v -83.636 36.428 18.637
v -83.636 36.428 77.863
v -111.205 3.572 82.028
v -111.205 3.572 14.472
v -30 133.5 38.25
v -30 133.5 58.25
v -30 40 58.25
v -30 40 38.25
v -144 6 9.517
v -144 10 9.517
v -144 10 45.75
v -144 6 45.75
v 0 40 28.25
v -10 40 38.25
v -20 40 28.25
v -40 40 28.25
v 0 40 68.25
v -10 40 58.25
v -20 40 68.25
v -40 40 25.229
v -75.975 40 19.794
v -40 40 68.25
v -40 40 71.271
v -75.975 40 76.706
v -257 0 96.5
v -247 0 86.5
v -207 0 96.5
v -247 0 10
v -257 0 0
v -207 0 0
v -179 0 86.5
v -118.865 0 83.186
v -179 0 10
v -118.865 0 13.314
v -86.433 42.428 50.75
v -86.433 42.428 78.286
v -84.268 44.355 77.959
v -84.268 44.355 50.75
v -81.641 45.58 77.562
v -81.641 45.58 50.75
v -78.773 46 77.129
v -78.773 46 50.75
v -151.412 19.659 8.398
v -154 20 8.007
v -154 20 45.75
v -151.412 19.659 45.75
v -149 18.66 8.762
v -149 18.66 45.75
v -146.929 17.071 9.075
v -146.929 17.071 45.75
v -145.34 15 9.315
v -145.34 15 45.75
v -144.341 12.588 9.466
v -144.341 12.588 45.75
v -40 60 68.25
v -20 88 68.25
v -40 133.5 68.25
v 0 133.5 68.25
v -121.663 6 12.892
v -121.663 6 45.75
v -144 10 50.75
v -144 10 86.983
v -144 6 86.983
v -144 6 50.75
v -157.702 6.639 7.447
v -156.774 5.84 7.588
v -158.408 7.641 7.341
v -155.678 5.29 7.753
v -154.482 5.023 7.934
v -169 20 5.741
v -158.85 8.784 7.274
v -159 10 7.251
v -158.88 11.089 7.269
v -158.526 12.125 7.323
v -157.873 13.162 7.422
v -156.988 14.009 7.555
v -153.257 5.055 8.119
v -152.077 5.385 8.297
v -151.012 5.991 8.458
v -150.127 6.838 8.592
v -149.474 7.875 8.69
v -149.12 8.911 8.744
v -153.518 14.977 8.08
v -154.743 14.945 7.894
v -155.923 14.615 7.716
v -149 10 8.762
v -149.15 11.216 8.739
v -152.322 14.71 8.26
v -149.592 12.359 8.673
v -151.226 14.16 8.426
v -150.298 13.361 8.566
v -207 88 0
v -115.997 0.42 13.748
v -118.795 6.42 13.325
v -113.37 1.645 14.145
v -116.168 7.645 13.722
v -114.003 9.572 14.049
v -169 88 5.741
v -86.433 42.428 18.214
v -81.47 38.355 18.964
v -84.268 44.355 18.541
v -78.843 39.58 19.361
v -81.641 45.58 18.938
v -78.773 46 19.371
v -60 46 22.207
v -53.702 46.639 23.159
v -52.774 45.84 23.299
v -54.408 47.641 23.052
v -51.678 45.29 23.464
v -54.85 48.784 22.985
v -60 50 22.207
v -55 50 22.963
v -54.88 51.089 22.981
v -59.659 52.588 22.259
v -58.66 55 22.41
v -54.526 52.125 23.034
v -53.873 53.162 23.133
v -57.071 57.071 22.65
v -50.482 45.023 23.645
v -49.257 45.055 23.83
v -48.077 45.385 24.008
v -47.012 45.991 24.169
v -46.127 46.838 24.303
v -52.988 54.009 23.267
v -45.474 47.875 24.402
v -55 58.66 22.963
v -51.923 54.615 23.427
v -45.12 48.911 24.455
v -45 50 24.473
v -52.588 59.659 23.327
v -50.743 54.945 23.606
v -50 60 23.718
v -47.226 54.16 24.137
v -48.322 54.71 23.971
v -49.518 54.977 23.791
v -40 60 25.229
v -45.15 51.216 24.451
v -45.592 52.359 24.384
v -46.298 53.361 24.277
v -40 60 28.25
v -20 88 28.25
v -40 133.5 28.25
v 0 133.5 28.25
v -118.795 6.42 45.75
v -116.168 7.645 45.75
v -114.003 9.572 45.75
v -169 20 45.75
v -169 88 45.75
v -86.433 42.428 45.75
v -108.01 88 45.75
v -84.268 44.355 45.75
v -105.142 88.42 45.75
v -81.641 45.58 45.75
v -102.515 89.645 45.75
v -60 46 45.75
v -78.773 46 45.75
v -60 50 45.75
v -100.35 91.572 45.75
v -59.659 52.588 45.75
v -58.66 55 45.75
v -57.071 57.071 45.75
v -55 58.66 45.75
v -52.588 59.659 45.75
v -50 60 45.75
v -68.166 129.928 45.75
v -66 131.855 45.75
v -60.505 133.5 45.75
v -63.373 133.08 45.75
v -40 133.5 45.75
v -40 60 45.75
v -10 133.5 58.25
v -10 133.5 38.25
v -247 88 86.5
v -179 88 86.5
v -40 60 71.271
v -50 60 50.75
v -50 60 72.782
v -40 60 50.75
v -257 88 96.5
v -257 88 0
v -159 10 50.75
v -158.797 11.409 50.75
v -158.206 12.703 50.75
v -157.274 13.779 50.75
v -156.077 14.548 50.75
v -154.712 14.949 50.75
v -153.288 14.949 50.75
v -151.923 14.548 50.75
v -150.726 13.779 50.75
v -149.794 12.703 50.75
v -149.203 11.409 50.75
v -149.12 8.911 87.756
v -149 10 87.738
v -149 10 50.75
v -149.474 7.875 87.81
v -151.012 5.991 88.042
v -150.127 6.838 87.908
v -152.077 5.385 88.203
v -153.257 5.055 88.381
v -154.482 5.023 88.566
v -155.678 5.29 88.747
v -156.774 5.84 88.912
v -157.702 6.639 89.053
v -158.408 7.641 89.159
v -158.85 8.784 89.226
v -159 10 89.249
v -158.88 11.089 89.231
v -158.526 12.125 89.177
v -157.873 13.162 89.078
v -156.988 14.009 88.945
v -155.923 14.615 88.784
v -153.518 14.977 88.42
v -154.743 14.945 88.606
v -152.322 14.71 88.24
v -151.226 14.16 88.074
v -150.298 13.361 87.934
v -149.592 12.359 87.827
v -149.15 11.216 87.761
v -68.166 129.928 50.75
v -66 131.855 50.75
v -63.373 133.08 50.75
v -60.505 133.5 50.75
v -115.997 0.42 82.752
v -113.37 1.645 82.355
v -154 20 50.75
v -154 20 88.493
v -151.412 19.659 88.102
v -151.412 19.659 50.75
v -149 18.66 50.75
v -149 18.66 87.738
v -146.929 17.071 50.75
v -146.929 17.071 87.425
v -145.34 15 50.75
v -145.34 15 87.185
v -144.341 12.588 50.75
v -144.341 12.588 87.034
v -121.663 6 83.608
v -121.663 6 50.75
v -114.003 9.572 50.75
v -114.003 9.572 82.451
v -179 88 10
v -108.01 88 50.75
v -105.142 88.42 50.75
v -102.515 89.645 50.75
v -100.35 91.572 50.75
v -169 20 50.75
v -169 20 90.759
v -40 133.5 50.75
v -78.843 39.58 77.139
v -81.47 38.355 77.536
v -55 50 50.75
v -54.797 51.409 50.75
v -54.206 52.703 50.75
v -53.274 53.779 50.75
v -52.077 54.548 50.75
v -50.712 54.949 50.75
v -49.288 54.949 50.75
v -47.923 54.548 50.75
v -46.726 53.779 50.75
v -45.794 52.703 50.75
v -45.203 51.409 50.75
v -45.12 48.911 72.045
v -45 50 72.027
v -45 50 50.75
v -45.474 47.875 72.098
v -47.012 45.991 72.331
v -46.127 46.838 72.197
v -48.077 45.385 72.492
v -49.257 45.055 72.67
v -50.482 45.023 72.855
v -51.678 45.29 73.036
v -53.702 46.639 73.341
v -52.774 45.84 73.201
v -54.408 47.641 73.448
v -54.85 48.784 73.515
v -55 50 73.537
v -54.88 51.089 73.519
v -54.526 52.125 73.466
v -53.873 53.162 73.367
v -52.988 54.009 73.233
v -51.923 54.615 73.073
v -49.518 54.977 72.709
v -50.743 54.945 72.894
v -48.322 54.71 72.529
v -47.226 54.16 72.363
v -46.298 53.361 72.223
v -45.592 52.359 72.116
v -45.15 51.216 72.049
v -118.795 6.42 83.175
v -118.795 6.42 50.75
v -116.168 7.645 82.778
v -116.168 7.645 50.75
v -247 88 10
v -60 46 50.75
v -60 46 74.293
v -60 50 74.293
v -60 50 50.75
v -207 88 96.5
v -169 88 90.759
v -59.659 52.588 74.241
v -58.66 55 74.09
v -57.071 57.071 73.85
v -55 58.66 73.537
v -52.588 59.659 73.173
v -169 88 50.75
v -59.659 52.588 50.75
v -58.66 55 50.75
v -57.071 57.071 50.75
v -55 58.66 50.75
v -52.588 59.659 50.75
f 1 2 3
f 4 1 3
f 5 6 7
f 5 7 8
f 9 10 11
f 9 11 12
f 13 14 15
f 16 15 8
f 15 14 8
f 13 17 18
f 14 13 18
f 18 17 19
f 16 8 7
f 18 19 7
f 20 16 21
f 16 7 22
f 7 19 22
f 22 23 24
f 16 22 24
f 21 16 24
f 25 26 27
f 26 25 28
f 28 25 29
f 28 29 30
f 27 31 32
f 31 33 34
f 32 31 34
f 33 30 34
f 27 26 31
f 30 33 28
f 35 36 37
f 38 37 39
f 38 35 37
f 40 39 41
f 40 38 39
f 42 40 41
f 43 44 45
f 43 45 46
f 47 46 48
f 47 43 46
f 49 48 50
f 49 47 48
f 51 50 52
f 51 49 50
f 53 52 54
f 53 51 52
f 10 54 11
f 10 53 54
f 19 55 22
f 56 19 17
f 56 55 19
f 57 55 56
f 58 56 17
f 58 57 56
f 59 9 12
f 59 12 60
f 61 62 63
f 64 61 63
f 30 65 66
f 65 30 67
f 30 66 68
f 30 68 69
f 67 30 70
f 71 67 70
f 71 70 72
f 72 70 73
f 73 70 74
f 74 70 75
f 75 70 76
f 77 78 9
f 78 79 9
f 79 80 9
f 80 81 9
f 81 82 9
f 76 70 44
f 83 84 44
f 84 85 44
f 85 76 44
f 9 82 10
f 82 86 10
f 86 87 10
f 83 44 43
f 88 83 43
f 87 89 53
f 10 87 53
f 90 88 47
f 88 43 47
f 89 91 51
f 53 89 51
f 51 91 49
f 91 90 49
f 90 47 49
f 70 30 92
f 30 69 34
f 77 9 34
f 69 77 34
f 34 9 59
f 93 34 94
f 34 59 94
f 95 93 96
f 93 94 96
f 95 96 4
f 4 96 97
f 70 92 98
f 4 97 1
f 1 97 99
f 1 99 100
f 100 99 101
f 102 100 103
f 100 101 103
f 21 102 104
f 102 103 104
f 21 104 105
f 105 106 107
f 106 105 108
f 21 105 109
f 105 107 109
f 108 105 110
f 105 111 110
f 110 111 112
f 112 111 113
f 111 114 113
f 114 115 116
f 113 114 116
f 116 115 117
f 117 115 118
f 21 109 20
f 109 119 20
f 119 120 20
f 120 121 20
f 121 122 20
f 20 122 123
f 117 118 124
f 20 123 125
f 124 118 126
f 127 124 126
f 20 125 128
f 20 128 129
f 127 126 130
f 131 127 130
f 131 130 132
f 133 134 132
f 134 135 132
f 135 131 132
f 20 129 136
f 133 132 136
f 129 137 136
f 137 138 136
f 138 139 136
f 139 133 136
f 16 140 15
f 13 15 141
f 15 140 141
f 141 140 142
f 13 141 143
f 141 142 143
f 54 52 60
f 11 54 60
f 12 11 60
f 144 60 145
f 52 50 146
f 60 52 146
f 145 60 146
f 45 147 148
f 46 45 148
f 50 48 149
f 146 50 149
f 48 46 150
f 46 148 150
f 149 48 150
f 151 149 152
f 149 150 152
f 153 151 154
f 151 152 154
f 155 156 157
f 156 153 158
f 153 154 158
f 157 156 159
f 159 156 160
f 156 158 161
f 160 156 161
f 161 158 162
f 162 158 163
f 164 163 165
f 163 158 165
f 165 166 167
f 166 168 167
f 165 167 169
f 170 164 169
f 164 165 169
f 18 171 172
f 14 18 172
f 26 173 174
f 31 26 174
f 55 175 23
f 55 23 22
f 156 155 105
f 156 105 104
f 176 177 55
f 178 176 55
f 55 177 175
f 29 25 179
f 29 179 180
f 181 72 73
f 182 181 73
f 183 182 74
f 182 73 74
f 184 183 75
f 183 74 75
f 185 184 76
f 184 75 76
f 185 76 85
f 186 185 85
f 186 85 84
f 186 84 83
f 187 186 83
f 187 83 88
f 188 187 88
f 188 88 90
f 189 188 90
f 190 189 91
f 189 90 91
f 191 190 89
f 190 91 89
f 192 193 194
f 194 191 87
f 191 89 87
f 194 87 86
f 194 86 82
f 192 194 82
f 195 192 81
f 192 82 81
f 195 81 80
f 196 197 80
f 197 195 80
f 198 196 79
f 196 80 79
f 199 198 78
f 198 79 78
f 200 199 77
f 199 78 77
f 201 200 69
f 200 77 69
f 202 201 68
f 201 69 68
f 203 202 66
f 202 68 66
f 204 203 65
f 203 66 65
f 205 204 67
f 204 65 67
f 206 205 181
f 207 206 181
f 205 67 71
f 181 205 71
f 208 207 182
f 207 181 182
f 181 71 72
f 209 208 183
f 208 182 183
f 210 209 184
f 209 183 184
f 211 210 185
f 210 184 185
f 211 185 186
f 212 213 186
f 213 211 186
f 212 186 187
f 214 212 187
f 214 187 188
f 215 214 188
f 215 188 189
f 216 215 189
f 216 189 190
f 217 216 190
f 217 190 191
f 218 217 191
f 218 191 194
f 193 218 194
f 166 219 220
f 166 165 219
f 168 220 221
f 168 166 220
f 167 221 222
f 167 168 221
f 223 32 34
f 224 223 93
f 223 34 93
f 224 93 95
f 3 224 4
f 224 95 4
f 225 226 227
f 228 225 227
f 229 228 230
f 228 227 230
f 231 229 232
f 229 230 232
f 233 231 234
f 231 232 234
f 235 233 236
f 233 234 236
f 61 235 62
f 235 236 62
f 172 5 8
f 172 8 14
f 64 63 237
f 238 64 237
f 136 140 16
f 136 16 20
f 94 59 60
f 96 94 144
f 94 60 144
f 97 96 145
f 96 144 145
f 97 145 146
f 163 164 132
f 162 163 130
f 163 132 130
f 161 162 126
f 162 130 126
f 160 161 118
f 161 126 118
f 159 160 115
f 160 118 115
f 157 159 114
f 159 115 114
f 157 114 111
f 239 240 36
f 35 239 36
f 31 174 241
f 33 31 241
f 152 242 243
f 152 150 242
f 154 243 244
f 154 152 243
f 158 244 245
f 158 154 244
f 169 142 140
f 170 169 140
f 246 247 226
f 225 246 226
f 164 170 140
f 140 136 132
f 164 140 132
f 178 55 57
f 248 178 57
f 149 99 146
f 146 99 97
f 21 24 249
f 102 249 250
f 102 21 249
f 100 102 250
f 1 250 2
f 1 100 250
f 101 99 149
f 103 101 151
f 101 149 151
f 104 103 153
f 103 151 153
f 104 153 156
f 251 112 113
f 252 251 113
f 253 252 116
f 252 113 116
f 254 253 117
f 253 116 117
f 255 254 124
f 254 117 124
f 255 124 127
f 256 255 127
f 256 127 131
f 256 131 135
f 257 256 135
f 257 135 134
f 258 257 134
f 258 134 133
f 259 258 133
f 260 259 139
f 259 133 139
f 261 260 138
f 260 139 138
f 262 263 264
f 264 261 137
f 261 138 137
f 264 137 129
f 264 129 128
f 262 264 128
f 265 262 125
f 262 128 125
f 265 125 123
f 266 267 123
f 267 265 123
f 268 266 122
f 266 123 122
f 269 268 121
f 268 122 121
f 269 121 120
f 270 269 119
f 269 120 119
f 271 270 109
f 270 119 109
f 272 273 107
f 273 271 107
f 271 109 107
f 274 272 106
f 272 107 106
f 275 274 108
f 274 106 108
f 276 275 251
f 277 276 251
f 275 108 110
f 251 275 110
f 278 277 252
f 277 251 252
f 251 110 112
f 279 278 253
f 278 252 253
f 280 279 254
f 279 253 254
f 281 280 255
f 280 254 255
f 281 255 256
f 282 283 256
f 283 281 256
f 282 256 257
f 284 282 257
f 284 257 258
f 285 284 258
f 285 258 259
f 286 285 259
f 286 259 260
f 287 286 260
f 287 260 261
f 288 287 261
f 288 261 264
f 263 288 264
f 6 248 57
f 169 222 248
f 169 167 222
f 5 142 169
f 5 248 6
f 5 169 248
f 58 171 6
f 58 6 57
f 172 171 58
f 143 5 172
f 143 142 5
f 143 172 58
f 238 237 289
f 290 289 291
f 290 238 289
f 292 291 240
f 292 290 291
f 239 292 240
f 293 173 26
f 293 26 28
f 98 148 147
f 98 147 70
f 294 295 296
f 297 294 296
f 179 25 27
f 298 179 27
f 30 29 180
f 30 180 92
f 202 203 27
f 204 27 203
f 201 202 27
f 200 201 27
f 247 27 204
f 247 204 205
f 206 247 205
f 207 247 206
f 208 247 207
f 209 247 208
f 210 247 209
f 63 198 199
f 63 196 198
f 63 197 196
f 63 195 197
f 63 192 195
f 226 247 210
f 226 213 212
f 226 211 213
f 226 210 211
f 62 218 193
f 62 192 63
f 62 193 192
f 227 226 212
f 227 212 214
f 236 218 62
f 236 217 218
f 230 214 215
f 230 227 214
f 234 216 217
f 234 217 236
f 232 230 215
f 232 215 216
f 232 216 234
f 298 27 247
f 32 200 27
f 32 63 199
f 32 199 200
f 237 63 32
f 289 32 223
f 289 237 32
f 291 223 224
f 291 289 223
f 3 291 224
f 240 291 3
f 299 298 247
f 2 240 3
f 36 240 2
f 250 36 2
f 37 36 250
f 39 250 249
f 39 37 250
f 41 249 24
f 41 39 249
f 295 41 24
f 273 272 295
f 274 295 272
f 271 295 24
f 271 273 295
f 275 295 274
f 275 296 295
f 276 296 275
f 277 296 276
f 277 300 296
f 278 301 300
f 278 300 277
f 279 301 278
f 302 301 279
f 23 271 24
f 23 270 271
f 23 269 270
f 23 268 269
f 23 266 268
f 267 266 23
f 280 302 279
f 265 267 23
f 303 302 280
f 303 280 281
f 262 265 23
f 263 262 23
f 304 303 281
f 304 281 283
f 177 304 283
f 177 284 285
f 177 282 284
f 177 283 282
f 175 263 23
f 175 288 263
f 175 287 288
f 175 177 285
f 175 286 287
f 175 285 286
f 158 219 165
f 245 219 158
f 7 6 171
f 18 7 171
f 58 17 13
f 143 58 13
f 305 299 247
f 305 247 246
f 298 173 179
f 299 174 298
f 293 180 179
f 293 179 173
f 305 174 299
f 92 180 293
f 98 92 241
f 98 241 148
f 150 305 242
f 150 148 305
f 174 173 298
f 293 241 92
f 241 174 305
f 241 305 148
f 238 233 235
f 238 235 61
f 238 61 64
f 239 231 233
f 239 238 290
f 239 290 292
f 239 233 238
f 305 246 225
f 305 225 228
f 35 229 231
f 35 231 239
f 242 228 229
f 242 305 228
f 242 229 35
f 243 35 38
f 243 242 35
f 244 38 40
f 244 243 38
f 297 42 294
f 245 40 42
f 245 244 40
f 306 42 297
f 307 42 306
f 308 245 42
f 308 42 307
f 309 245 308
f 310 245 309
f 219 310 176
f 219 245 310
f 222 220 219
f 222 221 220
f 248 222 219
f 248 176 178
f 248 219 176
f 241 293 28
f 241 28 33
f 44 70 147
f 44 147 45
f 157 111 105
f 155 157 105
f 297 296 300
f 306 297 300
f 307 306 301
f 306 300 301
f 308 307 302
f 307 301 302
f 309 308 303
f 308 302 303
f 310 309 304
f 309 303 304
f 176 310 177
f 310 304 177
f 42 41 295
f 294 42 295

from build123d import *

# Parameters (mm, degrees)
SKETCH1_W           = 257
SKETCH1_H           = 96.5
BOSS_EXTRUDE1_DEPTH = 133.5
SKETCH2_W           = 140
SKETCH2_H           = 96.5
CUT_EXTRUDE1_DEPTH  = 45.5
SKETCH3_W           = 52
SKETCH3_H           = 45.75
CUT_EXTRUDE2_DEPTH  = 68
SKETCH4_W           = 68
SKETCH4_H           = 76.5
CUT_EXTRUDE3_DEPTH  = 89
SKETCH5_R           = 5
CUT_EXTRUDE4_DEPTH  = 45.75
SKETCH6_R           = 5
CUT_EXTRUDE5_DEPTH  = 45.75
SKETCH7_R           = 5
CUT_EXTRUDE6_DEPTH  = 97.5
CUT_EXTRUDE7_DEPTH  = 97.5
CUT_EXTRUDE8_DEPTH  = 97.5
SKETCH10_R          = 5
CUT_EXTRUDE9_DEPTH  = 45.75
CUT_EXTRUDE10_DEPTH = 45.75
SKETCH12_R          = 5
CUT_EXTRUDE11_DEPTH = 97.5
SKETCH13_W          = 40
SKETCH13_H          = 28.25
CUT_EXTRUDE12_DEPTH = 134.5
SKETCH14_W          = 20
SKETCH14_H          = 20
CUT_EXTRUDE13_DEPTH = 134.5
CUT_EXTRUDE14_DEPTH = 89
FILLET1_R           = 10
FILLET2_R           = 10


with BuildPart() as part:
    # Sketch1 → Boss-Extrude1 (new body)
    with BuildSketch(Plane(origin=(0, 0, 0), x_dir=(1, 0, 0), z_dir=(0, 1, 0))):
        with Locations((-128.5, -48.25)):
            Rectangle(SKETCH1_W, SKETCH1_H)
    extrude(amount=BOSS_EXTRUDE1_DEPTH)

    # Sketch2 → Cut-Extrude1 (cut)
    with BuildSketch(Plane(origin=(0, 133.5, 0), x_dir=(1, 0, 0), z_dir=(0, 1, 0))):
        with Locations((-187, -48.25)):
            Rectangle(SKETCH2_W, SKETCH2_H)
    extrude(amount=-CUT_EXTRUDE1_DEPTH, mode=Mode.SUBTRACT)

    # Sketch3 → Cut-Extrude2 (cut)
    with BuildSketch(Plane(origin=(0, 88, 0), x_dir=(1, 0, 0), z_dir=(0, 1, 0))):
        with Locations((-143, -22.875)):
            Rectangle(SKETCH3_W, SKETCH3_H)
        with Locations((-143, -73.625)):
            Rectangle(SKETCH3_W, SKETCH3_H)
    extrude(amount=-CUT_EXTRUDE2_DEPTH, mode=Mode.SUBTRACT)

    # Sketch4 → Cut-Extrude3 (cut, through all)
    with BuildSketch(Plane(origin=(0, 88, 0), x_dir=(1, 0, 0), z_dir=(0, 1, 0))):
        with Locations((-213, -48.25)):
            Rectangle(SKETCH4_W, SKETCH4_H)
    extrude(amount=-CUT_EXTRUDE3_DEPTH, mode=Mode.SUBTRACT)

    # Sketch5 → Cut-Extrude4 (cut)
    with BuildSketch(Plane.XY.offset(96.5)):
        with Locations((-154, 10)):
            Circle(SKETCH5_R)
        with BuildLine():
            Line((-169, 20), (-154, 20))
            ThreePointArc((-154, 20), (-146.928932188, 17.071067812), (-144, 10))
            Line((-144, 10), (-144, 6))
            Line((-144, 6), (-117, 6))
            Line((-117, 6), (-117, 88))
            Line((-117, 88), (-169, 88))
            Line((-169, 88), (-169, 20))
        make_face()
    extrude(amount=-CUT_EXTRUDE4_DEPTH, mode=Mode.SUBTRACT)

    # Sketch6 → Cut-Extrude5 (cut)
    with BuildSketch(Plane(origin=(0, 0, 0), x_dir=(-1, 0, 0), z_dir=(0, 0, -1))):
        with Locations((154, 10)):
            Circle(SKETCH6_R)
        with BuildLine():
            Line((144, 6), (117, 6))
            Line((117, 6), (117, 88))
            Line((117, 88), (169, 88))
            Line((169, 88), (169, 20))
            Line((169, 20), (154, 20))
            ThreePointArc((154, 20), (146.928932188, 17.071067812), (144, 10))
            Line((144, 10), (144, 6))
        make_face()
    extrude(amount=-CUT_EXTRUDE5_DEPTH, mode=Mode.SUBTRACT)

    # Sketch7 → Cut-Extrude6 (cut, through all)
    with BuildSketch(Plane(origin=(0, 0, 0), x_dir=(-1, 0, 0), z_dir=(0, 0, -1))):
        with Locations((154, 10)):
            Circle(SKETCH7_R)
    extrude(amount=-CUT_EXTRUDE6_DEPTH, mode=Mode.SUBTRACT)

    # Sketch8 → Cut-Extrude7 (cut, through all)
    with BuildSketch(Plane.XY.offset(96.5)):
        Polygon((0, 40), (-80.638168804, 40), (-114.202154051, 0), (0, 0), align=None)
    extrude(amount=-CUT_EXTRUDE7_DEPTH, mode=Mode.SUBTRACT)

    # Sketch9 → Cut-Extrude8 (cut, through all)
    with BuildSketch(Plane.XY.offset(96.5)):
        Polygon((-65.168254999, 133.5), (-103.347288218, 88), (-117, 88), (-117, 133.5), align=None)
    extrude(amount=-CUT_EXTRUDE8_DEPTH, mode=Mode.SUBTRACT)

    # Sketch10 → Cut-Extrude9 (cut)
    with BuildSketch(Plane.XY.offset(96.5)):
        with Locations((-50, 50)):
            Circle(SKETCH10_R)
        with BuildLine():
            Line((-83.436014753, 46), (-60, 46))
            Line((-60, 46), (-60, 50))
            ThreePointArc((-60, 50), (-57.071067812, 57.071067812), (-50, 60))
            Line((-50, 60), (-40, 60))
            Line((-40, 60), (-40, 133.5))
            Line((-40, 133.5), (-65.168254999, 133.5))
            Line((-65.168254999, 133.5), (-103.347288218, 88))
            Line((-103.347288218, 88), (-117, 88))
            Line((-117, 88), (-117, 6))
            Line((-117, 6), (-83.436014753, 46))
        make_face()
    extrude(amount=-CUT_EXTRUDE9_DEPTH, mode=Mode.SUBTRACT)

    # Sketch11 → Cut-Extrude10 (cut)
    with BuildSketch(Plane(origin=(0, 0, 0), x_dir=(-1, 0, 0), z_dir=(0, 0, -1))):
        with BuildLine():
            Line((65.168254999, 133.5), (40, 133.5))
            Line((40, 133.5), (40, 60))
            Line((40, 60), (50, 60))
            ThreePointArc((50, 60), (57.071067812, 57.071067812), (60, 50))
            Line((60, 50), (60, 46))
            Line((60, 46), (83.436014753, 46))
            Line((83.436014753, 46), (117, 6))
            Line((117, 6), (117, 88))
            Line((117, 88), (103.347288218, 88))
            Line((103.347288218, 88), (65.168254999, 133.5))
        make_face()
    extrude(amount=-CUT_EXTRUDE10_DEPTH, mode=Mode.SUBTRACT)

    # Sketch12 → Cut-Extrude11 (cut, through all)
    with BuildSketch(Plane(origin=(0, 0, 0), x_dir=(-1, 0, 0), z_dir=(0, 0, -1))):
        with Locations((50, 50)):
            Circle(SKETCH12_R)
    extrude(amount=-CUT_EXTRUDE11_DEPTH, mode=Mode.SUBTRACT)

    # Sketch13 → Cut-Extrude12 (cut, through all)
    with BuildSketch(Plane(origin=(0, 133.5, 0), x_dir=(1, 0, 0), z_dir=(0, 1, 0))):
        with Locations((-20, -82.375)):
            Rectangle(SKETCH13_W, SKETCH13_H)
        with Locations((-20, -14.125)):
            Rectangle(SKETCH13_W, SKETCH13_H)
    extrude(amount=-CUT_EXTRUDE12_DEPTH, mode=Mode.SUBTRACT)

    # Sketch14 → Cut-Extrude13 (cut, through all)
    with BuildSketch(Plane(origin=(0, 133.5, 0), x_dir=(1, 0, 0), z_dir=(0, 1, 0))):
        with Locations((-20, -48.25)):
            Rectangle(SKETCH14_W, SKETCH14_H)
    extrude(amount=-CUT_EXTRUDE13_DEPTH, mode=Mode.SUBTRACT)

    # Sketch15 → Cut-Extrude14 (cut, through all)
    with BuildSketch(Plane(origin=(0, 88, 0), x_dir=(1, 0, 0), z_dir=(0, 1, 0))):
        Polygon((-207, 0), (-20, -28.25), (-20, 0), align=None)
        Polygon((-207, -96.5), (-20, -68.25), (-20, -96.5), align=None)
    extrude(amount=-CUT_EXTRUDE14_DEPTH, mode=Mode.SUBTRACT)

    # Fillet1
    fillet1_edges = [part.edges().sort_by_distance(p)[0] for p in [
        (-117, 6, 29.673128342),
        (-83.436014753, 46, 64.291624109),
        (-65.168254999, 133.5, 48.25),
        (-103.347288218, 88, 48.25),
        (-83.436014753, 46, 32.208375891),
        (-114.202154051, 0, 48.25),
        (-117, 6, 66.826871658),
    ]]
    fillet(fillet1_edges, radius=FILLET1_R)

    # Fillet2
    fillet2_edges = [part.edges().sort_by_distance(p)[0] for p in [
        (-80.638168804, 40, 48.25),
    ]]
    fillet(fillet2_edges, radius=FILLET2_R)


solid = part.part
